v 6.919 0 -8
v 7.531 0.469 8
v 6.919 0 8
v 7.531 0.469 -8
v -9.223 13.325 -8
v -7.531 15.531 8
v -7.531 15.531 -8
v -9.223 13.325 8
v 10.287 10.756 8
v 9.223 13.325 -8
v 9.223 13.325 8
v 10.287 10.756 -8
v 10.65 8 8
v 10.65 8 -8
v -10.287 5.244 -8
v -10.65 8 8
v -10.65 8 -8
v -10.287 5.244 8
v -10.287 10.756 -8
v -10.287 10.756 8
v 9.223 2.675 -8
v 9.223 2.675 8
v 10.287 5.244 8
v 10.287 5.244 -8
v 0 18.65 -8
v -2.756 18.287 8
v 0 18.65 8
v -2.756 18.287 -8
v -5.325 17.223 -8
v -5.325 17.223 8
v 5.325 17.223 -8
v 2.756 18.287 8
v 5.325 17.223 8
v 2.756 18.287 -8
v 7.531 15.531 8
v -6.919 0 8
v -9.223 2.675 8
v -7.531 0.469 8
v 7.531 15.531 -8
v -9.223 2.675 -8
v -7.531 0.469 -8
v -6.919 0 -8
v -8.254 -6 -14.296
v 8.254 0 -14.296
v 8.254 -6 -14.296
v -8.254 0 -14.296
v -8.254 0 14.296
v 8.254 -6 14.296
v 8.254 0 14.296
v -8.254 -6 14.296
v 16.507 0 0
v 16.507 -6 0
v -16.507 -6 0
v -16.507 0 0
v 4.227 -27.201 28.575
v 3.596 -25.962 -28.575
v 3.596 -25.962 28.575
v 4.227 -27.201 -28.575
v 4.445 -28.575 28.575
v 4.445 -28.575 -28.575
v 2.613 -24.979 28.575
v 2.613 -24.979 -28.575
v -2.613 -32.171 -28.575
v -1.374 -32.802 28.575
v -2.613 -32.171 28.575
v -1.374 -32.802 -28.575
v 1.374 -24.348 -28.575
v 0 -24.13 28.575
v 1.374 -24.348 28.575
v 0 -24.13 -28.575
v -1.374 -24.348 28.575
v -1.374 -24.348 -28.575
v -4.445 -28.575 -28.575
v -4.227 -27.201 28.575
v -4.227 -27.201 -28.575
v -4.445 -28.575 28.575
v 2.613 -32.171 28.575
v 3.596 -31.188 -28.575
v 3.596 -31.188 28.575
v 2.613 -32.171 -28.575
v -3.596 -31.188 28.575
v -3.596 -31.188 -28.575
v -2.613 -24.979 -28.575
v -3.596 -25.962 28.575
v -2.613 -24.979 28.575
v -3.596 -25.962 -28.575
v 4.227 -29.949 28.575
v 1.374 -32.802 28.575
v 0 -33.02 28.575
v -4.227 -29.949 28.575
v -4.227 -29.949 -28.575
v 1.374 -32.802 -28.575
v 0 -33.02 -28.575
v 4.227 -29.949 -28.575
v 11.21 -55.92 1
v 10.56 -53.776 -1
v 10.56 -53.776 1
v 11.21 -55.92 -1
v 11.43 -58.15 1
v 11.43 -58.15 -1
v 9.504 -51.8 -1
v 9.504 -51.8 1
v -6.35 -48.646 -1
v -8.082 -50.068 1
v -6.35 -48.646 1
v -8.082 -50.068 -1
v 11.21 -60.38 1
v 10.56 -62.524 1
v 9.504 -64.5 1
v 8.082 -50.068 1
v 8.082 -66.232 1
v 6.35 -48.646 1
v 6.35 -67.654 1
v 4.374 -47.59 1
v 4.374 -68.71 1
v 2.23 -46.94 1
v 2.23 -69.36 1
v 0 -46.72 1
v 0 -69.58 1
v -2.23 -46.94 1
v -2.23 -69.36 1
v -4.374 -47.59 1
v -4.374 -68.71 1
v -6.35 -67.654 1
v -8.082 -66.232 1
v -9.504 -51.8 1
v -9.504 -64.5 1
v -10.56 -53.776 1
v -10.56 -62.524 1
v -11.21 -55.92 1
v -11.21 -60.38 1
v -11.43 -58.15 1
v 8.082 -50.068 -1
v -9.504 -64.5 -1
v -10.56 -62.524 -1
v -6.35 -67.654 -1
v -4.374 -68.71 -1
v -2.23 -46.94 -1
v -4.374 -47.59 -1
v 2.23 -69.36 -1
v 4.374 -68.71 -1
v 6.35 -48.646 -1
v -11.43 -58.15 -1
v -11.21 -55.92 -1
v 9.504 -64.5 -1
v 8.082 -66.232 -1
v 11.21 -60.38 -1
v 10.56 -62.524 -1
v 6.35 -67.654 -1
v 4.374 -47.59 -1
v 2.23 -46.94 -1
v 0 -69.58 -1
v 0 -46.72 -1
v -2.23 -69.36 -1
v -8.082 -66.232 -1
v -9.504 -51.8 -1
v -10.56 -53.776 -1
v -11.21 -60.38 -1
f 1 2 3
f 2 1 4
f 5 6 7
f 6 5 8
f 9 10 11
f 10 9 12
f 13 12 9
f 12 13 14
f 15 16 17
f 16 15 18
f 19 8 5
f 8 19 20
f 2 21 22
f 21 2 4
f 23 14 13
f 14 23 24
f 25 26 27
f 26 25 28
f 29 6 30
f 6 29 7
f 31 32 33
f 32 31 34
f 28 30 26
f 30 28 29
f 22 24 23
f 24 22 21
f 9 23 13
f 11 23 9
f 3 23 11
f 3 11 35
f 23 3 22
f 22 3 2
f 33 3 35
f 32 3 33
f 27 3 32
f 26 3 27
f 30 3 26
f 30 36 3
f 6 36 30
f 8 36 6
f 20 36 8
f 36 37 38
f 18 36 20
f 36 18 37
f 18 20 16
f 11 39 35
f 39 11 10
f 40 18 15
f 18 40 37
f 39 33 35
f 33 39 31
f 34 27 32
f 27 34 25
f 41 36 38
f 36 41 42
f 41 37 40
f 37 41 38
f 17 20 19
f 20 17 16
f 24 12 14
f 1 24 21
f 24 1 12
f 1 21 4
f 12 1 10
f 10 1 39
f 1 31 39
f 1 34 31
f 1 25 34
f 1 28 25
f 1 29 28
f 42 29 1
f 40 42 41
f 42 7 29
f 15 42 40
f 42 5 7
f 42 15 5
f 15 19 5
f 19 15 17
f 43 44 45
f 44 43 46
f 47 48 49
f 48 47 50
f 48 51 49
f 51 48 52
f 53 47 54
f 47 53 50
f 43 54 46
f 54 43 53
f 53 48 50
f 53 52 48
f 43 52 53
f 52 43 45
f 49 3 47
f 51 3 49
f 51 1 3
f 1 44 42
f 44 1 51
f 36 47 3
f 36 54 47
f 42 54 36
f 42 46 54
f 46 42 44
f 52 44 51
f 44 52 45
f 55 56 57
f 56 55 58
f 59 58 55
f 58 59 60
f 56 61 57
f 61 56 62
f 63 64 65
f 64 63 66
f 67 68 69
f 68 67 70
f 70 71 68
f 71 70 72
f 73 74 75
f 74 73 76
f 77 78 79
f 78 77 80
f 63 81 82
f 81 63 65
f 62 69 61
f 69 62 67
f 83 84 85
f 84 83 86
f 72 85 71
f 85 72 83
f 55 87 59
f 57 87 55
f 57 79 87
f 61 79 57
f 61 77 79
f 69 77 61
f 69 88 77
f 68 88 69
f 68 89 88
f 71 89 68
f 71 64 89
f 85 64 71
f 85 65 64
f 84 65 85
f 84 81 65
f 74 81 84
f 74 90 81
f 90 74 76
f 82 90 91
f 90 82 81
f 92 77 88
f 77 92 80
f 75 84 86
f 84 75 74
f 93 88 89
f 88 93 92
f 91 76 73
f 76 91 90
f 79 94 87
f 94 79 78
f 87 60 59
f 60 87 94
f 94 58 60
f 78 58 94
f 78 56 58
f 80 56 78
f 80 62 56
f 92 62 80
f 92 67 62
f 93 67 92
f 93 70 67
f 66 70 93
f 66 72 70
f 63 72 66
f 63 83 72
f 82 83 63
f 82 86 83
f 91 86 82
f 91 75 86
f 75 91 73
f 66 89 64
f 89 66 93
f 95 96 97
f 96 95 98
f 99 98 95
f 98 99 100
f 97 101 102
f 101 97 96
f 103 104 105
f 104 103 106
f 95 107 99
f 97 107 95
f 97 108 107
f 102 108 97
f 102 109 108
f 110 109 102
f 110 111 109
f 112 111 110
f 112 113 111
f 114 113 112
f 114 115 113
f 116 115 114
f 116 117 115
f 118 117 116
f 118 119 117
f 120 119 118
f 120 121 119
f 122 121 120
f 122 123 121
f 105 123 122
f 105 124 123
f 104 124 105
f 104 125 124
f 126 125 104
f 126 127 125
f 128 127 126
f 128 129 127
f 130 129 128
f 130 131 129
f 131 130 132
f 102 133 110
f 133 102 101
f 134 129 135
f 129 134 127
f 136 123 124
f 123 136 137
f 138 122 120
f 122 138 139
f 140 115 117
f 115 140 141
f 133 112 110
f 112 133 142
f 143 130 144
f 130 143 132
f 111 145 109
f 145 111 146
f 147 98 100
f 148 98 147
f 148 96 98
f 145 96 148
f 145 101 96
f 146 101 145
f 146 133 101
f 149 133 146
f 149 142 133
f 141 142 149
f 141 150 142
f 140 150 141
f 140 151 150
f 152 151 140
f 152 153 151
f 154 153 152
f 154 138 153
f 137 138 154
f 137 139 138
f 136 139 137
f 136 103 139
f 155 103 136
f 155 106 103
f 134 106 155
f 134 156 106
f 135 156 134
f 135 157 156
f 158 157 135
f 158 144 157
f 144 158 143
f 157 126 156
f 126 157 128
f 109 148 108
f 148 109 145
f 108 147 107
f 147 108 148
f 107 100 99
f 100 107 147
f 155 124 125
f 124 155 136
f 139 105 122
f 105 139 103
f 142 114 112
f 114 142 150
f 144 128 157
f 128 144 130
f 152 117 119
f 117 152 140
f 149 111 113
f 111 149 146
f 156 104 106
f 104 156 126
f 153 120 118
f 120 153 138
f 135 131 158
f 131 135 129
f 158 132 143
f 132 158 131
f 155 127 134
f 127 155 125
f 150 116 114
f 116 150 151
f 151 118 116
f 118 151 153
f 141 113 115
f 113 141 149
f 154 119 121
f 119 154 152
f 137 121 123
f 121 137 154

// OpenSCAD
// Auto-generated by scripts/author_from_manifest.py (Phase D.3).
// Source: data/phase_d_manifest.json (sku_intent='tyco-ty3231-institutional-155f').
// Do not hand-edit — regenerate from the manifest.
//
// @part tyco_ty3231_institutional_155f
// @kind sprinkler_head
// @category head.pendant.k56
// @display-name "Tyco TY3231 Institutional Pendent K5.6 155°F"
// @mfg tyco_fire_protection
// @mfg-pn TY3231
// @listing UL FM
// @hazard-classes LH OH1
// @price-usd 62.00
// @install-minutes 10
// @crew journeyman
// @k-factor 5.6
// @orientation pendant
// @response quick
// @temperature 155F
// @param size_in number default=0.5 label="Size" unit="in"
// @port inlet position=[0,0.014,0] direction=[0,1,0] style=NPT_threaded size_in=0.5 role=drop

size_in = 0.5;
k_factor = 5.6;

length_mm   = 57.15;
body_dia_mm = 25.40;
thread_od   = 21.3;
thread_len  = 16;
deflector_d = body_dia_mm * 0.9;

 union() {
    translate([0, thread_len/2, 0])
        cylinder(h = thread_len, d = thread_od, center = true, $fn = 24);
    translate([0, -3, 0])
        rotate([90, 0, 0])
        cylinder(h = 6, d = thread_od * 1.55, $fn = 6, center = true);
    translate([0, -length_mm/2, 0])
        cylinder(h = length_mm, d = body_dia_mm * 0.35, center = true, $fn = 20);
    translate([0, -length_mm - 1, 0])
        cylinder(h = 2, d = deflector_d, center = true, $fn = 32);
}
